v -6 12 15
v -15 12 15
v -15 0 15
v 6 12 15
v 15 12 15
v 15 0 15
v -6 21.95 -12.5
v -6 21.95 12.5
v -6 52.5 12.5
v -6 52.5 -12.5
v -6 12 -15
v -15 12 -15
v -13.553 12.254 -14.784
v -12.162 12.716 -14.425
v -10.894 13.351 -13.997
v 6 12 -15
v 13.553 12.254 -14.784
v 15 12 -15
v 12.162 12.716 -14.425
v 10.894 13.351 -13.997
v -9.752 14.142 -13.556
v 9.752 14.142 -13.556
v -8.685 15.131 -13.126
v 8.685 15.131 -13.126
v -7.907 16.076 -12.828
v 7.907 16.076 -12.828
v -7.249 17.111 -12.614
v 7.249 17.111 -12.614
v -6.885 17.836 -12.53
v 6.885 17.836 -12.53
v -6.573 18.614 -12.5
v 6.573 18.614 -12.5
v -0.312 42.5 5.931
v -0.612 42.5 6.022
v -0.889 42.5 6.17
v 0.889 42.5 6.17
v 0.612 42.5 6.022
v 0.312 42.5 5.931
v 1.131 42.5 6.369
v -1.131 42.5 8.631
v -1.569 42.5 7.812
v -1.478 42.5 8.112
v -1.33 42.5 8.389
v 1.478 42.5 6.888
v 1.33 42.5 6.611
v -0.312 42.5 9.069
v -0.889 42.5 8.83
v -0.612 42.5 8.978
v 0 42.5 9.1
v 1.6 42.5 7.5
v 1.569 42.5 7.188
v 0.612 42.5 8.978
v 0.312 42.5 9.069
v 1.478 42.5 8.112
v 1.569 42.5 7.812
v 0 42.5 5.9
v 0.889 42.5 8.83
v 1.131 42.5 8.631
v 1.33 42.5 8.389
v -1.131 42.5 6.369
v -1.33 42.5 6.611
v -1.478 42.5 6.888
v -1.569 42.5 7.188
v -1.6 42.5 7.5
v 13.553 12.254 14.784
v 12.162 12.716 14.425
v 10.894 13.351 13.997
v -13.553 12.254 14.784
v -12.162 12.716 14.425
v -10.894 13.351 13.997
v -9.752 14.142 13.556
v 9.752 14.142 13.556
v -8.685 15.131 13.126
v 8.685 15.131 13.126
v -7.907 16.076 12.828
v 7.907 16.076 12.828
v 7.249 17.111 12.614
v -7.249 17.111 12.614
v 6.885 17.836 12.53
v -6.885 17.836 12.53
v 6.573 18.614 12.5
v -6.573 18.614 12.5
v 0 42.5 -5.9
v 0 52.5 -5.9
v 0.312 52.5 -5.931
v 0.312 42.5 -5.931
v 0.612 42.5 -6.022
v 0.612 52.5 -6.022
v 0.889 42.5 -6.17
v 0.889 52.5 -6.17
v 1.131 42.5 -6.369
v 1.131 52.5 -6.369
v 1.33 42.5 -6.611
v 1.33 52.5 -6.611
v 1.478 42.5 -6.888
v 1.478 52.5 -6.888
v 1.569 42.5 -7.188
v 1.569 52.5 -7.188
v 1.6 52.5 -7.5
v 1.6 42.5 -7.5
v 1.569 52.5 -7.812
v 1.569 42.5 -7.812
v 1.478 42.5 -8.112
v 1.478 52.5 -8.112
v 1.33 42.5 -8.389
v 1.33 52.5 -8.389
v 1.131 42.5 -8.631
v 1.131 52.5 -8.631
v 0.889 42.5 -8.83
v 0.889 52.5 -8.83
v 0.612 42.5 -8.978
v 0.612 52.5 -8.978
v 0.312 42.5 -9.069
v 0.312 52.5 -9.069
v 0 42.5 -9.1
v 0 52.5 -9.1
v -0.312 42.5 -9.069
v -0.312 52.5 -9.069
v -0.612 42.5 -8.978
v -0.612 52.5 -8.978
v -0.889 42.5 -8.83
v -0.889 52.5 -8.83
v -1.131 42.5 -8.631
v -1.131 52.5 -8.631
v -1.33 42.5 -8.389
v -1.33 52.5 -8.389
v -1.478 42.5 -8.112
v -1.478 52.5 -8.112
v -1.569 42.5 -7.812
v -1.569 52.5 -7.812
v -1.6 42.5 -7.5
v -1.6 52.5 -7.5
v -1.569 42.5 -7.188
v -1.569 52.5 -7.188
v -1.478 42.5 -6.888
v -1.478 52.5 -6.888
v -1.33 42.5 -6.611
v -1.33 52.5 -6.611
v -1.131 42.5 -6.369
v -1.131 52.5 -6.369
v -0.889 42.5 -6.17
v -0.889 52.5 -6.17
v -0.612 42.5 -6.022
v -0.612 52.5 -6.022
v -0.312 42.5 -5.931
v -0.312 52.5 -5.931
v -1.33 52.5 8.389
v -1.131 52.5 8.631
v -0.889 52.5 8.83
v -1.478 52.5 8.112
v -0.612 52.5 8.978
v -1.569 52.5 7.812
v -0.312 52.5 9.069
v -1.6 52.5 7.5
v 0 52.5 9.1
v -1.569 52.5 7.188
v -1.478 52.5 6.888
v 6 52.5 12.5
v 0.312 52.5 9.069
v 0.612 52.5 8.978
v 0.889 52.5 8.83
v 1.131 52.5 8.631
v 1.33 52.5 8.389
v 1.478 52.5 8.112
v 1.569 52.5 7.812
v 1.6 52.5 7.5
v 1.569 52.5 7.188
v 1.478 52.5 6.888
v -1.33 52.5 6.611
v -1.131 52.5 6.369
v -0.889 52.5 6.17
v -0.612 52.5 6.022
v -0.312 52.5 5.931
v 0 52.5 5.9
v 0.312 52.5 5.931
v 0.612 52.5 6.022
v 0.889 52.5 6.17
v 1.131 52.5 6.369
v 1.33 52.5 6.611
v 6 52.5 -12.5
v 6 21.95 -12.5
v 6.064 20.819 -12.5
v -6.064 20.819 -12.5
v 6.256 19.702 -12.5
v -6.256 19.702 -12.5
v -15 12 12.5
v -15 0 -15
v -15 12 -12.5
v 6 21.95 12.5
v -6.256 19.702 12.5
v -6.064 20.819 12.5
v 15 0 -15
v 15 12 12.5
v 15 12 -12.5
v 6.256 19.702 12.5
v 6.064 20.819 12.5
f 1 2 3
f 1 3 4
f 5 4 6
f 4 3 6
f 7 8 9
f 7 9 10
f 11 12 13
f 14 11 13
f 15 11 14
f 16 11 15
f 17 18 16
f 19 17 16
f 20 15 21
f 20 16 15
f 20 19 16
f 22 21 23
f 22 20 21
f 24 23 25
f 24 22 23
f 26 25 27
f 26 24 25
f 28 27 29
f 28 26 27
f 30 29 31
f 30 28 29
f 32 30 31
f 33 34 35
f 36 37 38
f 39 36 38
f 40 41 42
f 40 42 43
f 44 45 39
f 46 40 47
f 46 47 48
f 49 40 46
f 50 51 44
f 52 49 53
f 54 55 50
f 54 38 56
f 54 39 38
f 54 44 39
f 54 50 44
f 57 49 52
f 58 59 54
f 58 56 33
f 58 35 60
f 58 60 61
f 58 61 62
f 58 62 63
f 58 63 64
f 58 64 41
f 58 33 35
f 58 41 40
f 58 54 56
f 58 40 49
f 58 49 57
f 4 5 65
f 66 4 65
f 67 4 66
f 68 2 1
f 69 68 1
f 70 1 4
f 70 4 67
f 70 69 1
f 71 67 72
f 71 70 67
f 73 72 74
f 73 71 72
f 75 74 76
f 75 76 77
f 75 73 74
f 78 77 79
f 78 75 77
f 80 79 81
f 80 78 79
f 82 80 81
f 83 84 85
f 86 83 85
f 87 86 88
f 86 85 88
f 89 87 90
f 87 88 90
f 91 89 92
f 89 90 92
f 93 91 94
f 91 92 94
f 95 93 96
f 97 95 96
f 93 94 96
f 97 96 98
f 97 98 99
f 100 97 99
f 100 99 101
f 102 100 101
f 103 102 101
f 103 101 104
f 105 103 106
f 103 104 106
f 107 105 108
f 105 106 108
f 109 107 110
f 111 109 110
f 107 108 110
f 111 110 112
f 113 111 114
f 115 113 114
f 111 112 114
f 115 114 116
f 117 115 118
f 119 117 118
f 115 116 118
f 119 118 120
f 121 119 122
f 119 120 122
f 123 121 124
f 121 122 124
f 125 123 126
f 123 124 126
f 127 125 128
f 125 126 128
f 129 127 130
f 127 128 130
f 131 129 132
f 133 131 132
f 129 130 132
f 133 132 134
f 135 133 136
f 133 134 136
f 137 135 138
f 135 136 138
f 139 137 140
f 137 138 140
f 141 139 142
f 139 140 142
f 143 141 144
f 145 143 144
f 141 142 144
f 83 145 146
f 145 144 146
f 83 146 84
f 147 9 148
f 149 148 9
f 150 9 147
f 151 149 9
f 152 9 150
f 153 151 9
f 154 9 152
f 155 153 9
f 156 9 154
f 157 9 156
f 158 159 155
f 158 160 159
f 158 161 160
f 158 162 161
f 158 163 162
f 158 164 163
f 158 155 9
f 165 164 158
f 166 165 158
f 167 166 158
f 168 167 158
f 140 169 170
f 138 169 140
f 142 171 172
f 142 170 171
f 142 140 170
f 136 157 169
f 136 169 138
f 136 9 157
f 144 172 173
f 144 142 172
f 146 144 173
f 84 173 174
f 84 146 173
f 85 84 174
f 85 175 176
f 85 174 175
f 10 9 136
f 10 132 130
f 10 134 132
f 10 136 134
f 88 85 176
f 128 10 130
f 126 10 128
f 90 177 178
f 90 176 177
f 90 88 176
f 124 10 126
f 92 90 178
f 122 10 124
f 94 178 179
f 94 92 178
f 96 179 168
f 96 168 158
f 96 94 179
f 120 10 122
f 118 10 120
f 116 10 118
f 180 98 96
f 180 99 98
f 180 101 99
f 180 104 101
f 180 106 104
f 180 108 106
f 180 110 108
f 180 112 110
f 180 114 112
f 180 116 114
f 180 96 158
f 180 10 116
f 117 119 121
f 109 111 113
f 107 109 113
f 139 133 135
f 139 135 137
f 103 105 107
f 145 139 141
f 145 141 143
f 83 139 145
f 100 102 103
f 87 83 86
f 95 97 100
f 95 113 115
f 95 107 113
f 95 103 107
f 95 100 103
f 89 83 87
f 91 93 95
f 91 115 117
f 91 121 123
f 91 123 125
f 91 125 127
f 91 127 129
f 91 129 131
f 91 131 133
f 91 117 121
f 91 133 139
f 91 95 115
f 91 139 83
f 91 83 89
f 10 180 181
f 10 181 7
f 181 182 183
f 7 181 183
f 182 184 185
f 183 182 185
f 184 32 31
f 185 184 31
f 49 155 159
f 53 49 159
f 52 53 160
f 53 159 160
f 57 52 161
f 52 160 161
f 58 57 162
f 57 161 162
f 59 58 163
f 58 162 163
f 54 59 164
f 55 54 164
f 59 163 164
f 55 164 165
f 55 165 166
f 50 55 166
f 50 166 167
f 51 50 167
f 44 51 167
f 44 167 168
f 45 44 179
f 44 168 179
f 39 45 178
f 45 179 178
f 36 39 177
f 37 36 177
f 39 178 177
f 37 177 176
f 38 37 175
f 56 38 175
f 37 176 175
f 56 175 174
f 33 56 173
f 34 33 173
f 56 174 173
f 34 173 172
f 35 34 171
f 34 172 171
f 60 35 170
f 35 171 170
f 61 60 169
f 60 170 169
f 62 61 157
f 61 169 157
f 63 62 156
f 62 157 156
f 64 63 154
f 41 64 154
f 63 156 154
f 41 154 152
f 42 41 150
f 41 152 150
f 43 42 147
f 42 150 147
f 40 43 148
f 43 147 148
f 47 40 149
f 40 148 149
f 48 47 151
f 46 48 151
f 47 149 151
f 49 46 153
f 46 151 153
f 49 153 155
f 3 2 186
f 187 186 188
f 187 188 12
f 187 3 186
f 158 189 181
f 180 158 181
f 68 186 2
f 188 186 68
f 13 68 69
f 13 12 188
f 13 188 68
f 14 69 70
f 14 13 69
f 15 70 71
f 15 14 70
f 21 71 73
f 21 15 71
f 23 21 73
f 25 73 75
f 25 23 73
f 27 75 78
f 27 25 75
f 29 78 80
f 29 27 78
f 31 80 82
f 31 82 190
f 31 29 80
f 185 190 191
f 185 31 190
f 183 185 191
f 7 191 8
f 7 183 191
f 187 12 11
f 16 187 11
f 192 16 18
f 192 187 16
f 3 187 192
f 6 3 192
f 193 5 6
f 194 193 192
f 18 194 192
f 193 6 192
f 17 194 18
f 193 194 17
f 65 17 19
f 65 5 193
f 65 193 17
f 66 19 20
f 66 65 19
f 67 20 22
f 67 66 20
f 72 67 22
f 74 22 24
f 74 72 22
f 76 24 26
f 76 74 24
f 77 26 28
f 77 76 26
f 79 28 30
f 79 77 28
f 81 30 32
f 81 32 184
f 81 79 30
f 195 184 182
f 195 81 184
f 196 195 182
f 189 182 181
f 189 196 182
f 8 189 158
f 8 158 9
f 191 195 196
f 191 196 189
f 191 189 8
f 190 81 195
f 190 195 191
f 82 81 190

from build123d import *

# Parameters (mm, degrees)
SKETCH1_W           = 30
SKETCH1_H           = 30
BOSS_EXTRUDE1_DEPTH = 12
SKETCH2_W           = 12
SKETCH2_H           = 25
BOSS_EXTRUDE2_DEPTH = 40.5
SKETCH3_R           = 1.6
CUT_EXTRUDE1_DEPTH  = 10
FILLET1_R           = 10


with BuildPart() as part:
    # Sketch1 → Boss-Extrude1 (new body)
    with BuildSketch(Plane(origin=(0, 0, 0), x_dir=(1, 0, 0), z_dir=(0, 1, 0))):
        Rectangle(SKETCH1_W, SKETCH1_H)
    extrude(amount=BOSS_EXTRUDE1_DEPTH)

    # Sketch2 → Boss-Extrude2 (add)
    with BuildSketch(Plane(origin=(0, 12, 0), x_dir=(1, 0, 0), z_dir=(0, 1, 0))):
        Rectangle(SKETCH2_W, SKETCH2_H)
    extrude(amount=BOSS_EXTRUDE2_DEPTH)

    # Sketch3 → Cut-Extrude1 (cut)
    with BuildSketch(Plane(origin=(0, 52.5, 0), x_dir=(1, 0, 0), z_dir=(0, 1, 0))):
        with Locations(Location((0, -7.5, 0), (0, 0, 270))):
            Circle(SKETCH3_R)
        with Locations(Location((0, 7.5, 0), (0, 0, 270))):
            Circle(SKETCH3_R)
    extrude(amount=-CUT_EXTRUDE1_DEPTH, mode=Mode.SUBTRACT)

    # Fillet1
    # the kernel refuses this fillet: 10 mm, written as the material it adds along each edge
    with BuildSketch(Plane(origin=(6, 12, 12.5), x_dir=(1, 0, 0), z_dir=(0, 0, -1)), Plane(origin=(-6, 12, -12.5), x_dir=(-1, 0, 0), z_dir=(0, 0, 1))) as fillet1_piece_1:
        with BuildLine():
            CenterArc((10, -9.949874371), FILLET1_R, 95.739170477, 84.260829523)
            Line((0, -9.949874371), (-0.2, -9.949874371))
            Line((-0.2, -9.949874371), (-0.2, 0))
            Line((-0.2, 0), (0, 0.2))
            ThreePointArc((0, 0.2), (4.5, 0.2), (8.98, 0.198997487))
            Line((8.98, 0.198997487), (9, 0))
        make_face()
    extrude(amount=25)
    with BuildSketch(Plane(origin=(6, 12, -12.5), x_dir=(0, 0, -1), z_dir=(-1, 0, 0)), Plane(origin=(-6, 12, 12.5), x_dir=(0, 0, 1), z_dir=(1, 0, 0))) as fillet1_piece_2:
        with BuildLine():
            CenterArc((10, -6.614378278), FILLET1_R, 138.590377891, 41.409622109)
            Line((0, -6.614378278), (-0.2, -6.614378278))
            Line((-0.2, -6.614378278), (-0.2, 0))
            Line((-0.2, 0), (0, 0.2))
            ThreePointArc((0, 0.2), (1.25, 0.2), (2.35, 0.132287566))
            Line((2.35, 0.132287566), (2.5, 0))
        make_face()
    extrude(amount=12)
    with BuildSketch(Plane(origin=(6, 12, 37.374685928), x_dir=(1, 0, 0), z_dir=(0, 0, -1))) as fillet1_piece_3a_section:
        with BuildLine():
            CenterArc((10, -9.949874371), FILLET1_R, 95.739170477, 84.260829523)
            Line((0, -9.949874371), (-0.2, -9.949874371))
            Line((-0.2, -9.949874371), (-0.2, 0))
            Line((-0.2, 0), (0, 0.2))
            ThreePointArc((0, 0.2), (4.5, 0.2), (8.98, 0.198997487))
            Line((8.98, 0.198997487), (9, 0))
        make_face()
    fillet1_piece_3a = extrude(amount=49.874685928, mode=Mode.PRIVATE)
    fillet1_piece_3a = split(fillet1_piece_3a, bisect_by=Plane(origin=(8.162151556, 14.281986067, 15), z_dir=(0, 0, -1)), keep=Keep.TOP, mode=Mode.PRIVATE)
    fillet1_piece_3a = split(fillet1_piece_3a, bisect_by=Plane(origin=(8.162151556, 14.281986067, 12.5), z_dir=(0, 0, 1)), keep=Keep.TOP, mode=Mode.PRIVATE)
    with BuildSketch(Plane(origin=(-6, 12, 12.5), x_dir=(0, 0, 1), z_dir=(1, 0, 0))) as fillet1_piece_3b_section:
        with BuildLine():
            CenterArc((10, -6.614378278), FILLET1_R, 138.590377891, 41.409622109)
            Line((0, -6.614378278), (-0.2, -6.614378278))
            Line((-0.2, -6.614378278), (-0.2, 0))
            Line((-0.2, 0), (0, 0.2))
            ThreePointArc((0, 0.2), (1.25, 0.2), (2.35, 0.132287566))
            Line((2.35, 0.132287566), (2.5, 0))
        make_face()
    fillet1_piece_3b = extrude(amount=28.535945694, mode=Mode.PRIVATE)
    fillet1_piece_3b = split(fillet1_piece_3b, bisect_by=Plane(origin=(15, 13.814075663, 13.097749904), z_dir=(-1, 0, 0)), keep=Keep.TOP, mode=Mode.PRIVATE)
    fillet1_piece_3b = split(fillet1_piece_3b, bisect_by=Plane(origin=(6, 13.814075663, 13.097749904), z_dir=(1, 0, 0)), keep=Keep.TOP, mode=Mode.PRIVATE)
    fillet1_piece_3 = fillet1_piece_3a & fillet1_piece_3b
    add(fillet1_piece_3)
    with BuildSketch(Plane(origin=(6, 12, 12.5), x_dir=(1, 0, 0), z_dir=(0, 0, -1))) as fillet1_piece_4a_section:
        with BuildLine():
            CenterArc((10, -9.949874371), FILLET1_R, 95.739170477, 84.260829523)
            Line((0, -9.949874371), (-0.2, -9.949874371))
            Line((-0.2, -9.949874371), (-0.2, 0))
            Line((-0.2, 0), (0, 0.2))
            ThreePointArc((0, 0.2), (4.5, 0.2), (8.98, 0.198997487))
            Line((8.98, 0.198997487), (9, 0))
        make_face()
    fillet1_piece_4a = extrude(amount=49.874685928, mode=Mode.PRIVATE)
    fillet1_piece_4a = split(fillet1_piece_4a, bisect_by=Plane(origin=(8.162151556, 14.281986067, -15), z_dir=(0, 0, 1)), keep=Keep.TOP, mode=Mode.PRIVATE)
    fillet1_piece_4a = split(fillet1_piece_4a, bisect_by=Plane(origin=(8.162151556, 14.281986067, -12.5), z_dir=(0, 0, -1)), keep=Keep.TOP, mode=Mode.PRIVATE)
    with BuildSketch(Plane(origin=(22.535945694, 12, -12.5), x_dir=(0, 0, -1), z_dir=(-1, 0, 0))) as fillet1_piece_4b_section:
        with BuildLine():
            CenterArc((10, -6.614378278), FILLET1_R, 138.590377891, 41.409622109)
            Line((0, -6.614378278), (-0.2, -6.614378278))
            Line((-0.2, -6.614378278), (-0.2, 0))
            Line((-0.2, 0), (0, 0.2))
            ThreePointArc((0, 0.2), (1.25, 0.2), (2.35, 0.132287566))
            Line((2.35, 0.132287566), (2.5, 0))
        make_face()
    fillet1_piece_4b = extrude(amount=28.535945694, mode=Mode.PRIVATE)
    fillet1_piece_4b = split(fillet1_piece_4b, bisect_by=Plane(origin=(15, 13.814075663, -13.097749904), z_dir=(-1, 0, 0)), keep=Keep.TOP, mode=Mode.PRIVATE)
    fillet1_piece_4b = split(fillet1_piece_4b, bisect_by=Plane(origin=(6, 13.814075663, -13.097749904), z_dir=(1, 0, 0)), keep=Keep.TOP, mode=Mode.PRIVATE)
    fillet1_piece_4 = fillet1_piece_4a & fillet1_piece_4b
    add(fillet1_piece_4)
    with BuildSketch(Plane(origin=(-6, 12, -37.374685928), x_dir=(-1, 0, 0), z_dir=(0, 0, 1))) as fillet1_piece_5a_section:
        with BuildLine():
            CenterArc((10, -9.949874371), FILLET1_R, 95.739170477, 84.260829523)
            Line((0, -9.949874371), (-0.2, -9.949874371))
            Line((-0.2, -9.949874371), (-0.2, 0))
            Line((-0.2, 0), (0, 0.2))
            ThreePointArc((0, 0.2), (4.5, 0.2), (8.98, 0.198997487))
            Line((8.98, 0.198997487), (9, 0))
        make_face()
    fillet1_piece_5a = extrude(amount=49.874685928, mode=Mode.PRIVATE)
    fillet1_piece_5a = split(fillet1_piece_5a, bisect_by=Plane(origin=(-8.162151556, 14.281986067, -15), z_dir=(0, 0, 1)), keep=Keep.TOP, mode=Mode.PRIVATE)
    fillet1_piece_5a = split(fillet1_piece_5a, bisect_by=Plane(origin=(-8.162151556, 14.281986067, -12.5), z_dir=(0, 0, -1)), keep=Keep.TOP, mode=Mode.PRIVATE)
    with BuildSketch(Plane(origin=(6, 12, -12.5), x_dir=(0, 0, -1), z_dir=(-1, 0, 0))) as fillet1_piece_5b_section:
        with BuildLine():
            CenterArc((10, -6.614378278), FILLET1_R, 138.590377891, 41.409622109)
            Line((0, -6.614378278), (-0.2, -6.614378278))
            Line((-0.2, -6.614378278), (-0.2, 0))
            Line((-0.2, 0), (0, 0.2))
            ThreePointArc((0, 0.2), (1.25, 0.2), (2.35, 0.132287566))
            Line((2.35, 0.132287566), (2.5, 0))
        make_face()
    fillet1_piece_5b = extrude(amount=28.535945694, mode=Mode.PRIVATE)
    fillet1_piece_5b = split(fillet1_piece_5b, bisect_by=Plane(origin=(-15, 13.814075663, -13.097749904), z_dir=(1, 0, 0)), keep=Keep.TOP, mode=Mode.PRIVATE)
    fillet1_piece_5b = split(fillet1_piece_5b, bisect_by=Plane(origin=(-6, 13.814075663, -13.097749904), z_dir=(-1, 0, 0)), keep=Keep.TOP, mode=Mode.PRIVATE)
    fillet1_piece_5 = fillet1_piece_5a & fillet1_piece_5b
    add(fillet1_piece_5)
    with BuildSketch(Plane(origin=(-22.535945694, 12, 12.5), x_dir=(0, 0, 1), z_dir=(1, 0, 0))) as fillet1_piece_6a_section:
        with BuildLine():
            CenterArc((10, -6.614378278), FILLET1_R, 138.590377891, 41.409622109)
            Line((0, -6.614378278), (-0.2, -6.614378278))
            Line((-0.2, -6.614378278), (-0.2, 0))
            Line((-0.2, 0), (0, 0.2))
            ThreePointArc((0, 0.2), (1.25, 0.2), (2.35, 0.132287566))
            Line((2.35, 0.132287566), (2.5, 0))
        make_face()
    fillet1_piece_6a = extrude(amount=28.535945694, mode=Mode.PRIVATE)
    fillet1_piece_6a = split(fillet1_piece_6a, bisect_by=Plane(origin=(-15, 13.814075663, 13.097749904), z_dir=(1, 0, 0)), keep=Keep.TOP, mode=Mode.PRIVATE)
    fillet1_piece_6a = split(fillet1_piece_6a, bisect_by=Plane(origin=(-6, 13.814075663, 13.097749904), z_dir=(-1, 0, 0)), keep=Keep.TOP, mode=Mode.PRIVATE)
    with BuildSketch(Plane(origin=(-6, 12, -12.5), x_dir=(-1, 0, 0), z_dir=(0, 0, 1))) as fillet1_piece_6b_section:
        with BuildLine():
            CenterArc((10, -9.949874371), FILLET1_R, 95.739170477, 84.260829523)
            Line((0, -9.949874371), (-0.2, -9.949874371))
            Line((-0.2, -9.949874371), (-0.2, 0))
            Line((-0.2, 0), (0, 0.2))
            ThreePointArc((0, 0.2), (4.5, 0.2), (8.98, 0.198997487))
            Line((8.98, 0.198997487), (9, 0))
        make_face()
    fillet1_piece_6b = extrude(amount=49.874685928, mode=Mode.PRIVATE)
    fillet1_piece_6b = split(fillet1_piece_6b, bisect_by=Plane(origin=(-8.162151556, 14.281986067, 15), z_dir=(0, 0, -1)), keep=Keep.TOP, mode=Mode.PRIVATE)
    fillet1_piece_6b = split(fillet1_piece_6b, bisect_by=Plane(origin=(-8.162151556, 14.281986067, 12.5), z_dir=(0, 0, 1)), keep=Keep.TOP, mode=Mode.PRIVATE)
    fillet1_piece_6 = fillet1_piece_6a & fillet1_piece_6b
    add(fillet1_piece_6)


solid = part.part
